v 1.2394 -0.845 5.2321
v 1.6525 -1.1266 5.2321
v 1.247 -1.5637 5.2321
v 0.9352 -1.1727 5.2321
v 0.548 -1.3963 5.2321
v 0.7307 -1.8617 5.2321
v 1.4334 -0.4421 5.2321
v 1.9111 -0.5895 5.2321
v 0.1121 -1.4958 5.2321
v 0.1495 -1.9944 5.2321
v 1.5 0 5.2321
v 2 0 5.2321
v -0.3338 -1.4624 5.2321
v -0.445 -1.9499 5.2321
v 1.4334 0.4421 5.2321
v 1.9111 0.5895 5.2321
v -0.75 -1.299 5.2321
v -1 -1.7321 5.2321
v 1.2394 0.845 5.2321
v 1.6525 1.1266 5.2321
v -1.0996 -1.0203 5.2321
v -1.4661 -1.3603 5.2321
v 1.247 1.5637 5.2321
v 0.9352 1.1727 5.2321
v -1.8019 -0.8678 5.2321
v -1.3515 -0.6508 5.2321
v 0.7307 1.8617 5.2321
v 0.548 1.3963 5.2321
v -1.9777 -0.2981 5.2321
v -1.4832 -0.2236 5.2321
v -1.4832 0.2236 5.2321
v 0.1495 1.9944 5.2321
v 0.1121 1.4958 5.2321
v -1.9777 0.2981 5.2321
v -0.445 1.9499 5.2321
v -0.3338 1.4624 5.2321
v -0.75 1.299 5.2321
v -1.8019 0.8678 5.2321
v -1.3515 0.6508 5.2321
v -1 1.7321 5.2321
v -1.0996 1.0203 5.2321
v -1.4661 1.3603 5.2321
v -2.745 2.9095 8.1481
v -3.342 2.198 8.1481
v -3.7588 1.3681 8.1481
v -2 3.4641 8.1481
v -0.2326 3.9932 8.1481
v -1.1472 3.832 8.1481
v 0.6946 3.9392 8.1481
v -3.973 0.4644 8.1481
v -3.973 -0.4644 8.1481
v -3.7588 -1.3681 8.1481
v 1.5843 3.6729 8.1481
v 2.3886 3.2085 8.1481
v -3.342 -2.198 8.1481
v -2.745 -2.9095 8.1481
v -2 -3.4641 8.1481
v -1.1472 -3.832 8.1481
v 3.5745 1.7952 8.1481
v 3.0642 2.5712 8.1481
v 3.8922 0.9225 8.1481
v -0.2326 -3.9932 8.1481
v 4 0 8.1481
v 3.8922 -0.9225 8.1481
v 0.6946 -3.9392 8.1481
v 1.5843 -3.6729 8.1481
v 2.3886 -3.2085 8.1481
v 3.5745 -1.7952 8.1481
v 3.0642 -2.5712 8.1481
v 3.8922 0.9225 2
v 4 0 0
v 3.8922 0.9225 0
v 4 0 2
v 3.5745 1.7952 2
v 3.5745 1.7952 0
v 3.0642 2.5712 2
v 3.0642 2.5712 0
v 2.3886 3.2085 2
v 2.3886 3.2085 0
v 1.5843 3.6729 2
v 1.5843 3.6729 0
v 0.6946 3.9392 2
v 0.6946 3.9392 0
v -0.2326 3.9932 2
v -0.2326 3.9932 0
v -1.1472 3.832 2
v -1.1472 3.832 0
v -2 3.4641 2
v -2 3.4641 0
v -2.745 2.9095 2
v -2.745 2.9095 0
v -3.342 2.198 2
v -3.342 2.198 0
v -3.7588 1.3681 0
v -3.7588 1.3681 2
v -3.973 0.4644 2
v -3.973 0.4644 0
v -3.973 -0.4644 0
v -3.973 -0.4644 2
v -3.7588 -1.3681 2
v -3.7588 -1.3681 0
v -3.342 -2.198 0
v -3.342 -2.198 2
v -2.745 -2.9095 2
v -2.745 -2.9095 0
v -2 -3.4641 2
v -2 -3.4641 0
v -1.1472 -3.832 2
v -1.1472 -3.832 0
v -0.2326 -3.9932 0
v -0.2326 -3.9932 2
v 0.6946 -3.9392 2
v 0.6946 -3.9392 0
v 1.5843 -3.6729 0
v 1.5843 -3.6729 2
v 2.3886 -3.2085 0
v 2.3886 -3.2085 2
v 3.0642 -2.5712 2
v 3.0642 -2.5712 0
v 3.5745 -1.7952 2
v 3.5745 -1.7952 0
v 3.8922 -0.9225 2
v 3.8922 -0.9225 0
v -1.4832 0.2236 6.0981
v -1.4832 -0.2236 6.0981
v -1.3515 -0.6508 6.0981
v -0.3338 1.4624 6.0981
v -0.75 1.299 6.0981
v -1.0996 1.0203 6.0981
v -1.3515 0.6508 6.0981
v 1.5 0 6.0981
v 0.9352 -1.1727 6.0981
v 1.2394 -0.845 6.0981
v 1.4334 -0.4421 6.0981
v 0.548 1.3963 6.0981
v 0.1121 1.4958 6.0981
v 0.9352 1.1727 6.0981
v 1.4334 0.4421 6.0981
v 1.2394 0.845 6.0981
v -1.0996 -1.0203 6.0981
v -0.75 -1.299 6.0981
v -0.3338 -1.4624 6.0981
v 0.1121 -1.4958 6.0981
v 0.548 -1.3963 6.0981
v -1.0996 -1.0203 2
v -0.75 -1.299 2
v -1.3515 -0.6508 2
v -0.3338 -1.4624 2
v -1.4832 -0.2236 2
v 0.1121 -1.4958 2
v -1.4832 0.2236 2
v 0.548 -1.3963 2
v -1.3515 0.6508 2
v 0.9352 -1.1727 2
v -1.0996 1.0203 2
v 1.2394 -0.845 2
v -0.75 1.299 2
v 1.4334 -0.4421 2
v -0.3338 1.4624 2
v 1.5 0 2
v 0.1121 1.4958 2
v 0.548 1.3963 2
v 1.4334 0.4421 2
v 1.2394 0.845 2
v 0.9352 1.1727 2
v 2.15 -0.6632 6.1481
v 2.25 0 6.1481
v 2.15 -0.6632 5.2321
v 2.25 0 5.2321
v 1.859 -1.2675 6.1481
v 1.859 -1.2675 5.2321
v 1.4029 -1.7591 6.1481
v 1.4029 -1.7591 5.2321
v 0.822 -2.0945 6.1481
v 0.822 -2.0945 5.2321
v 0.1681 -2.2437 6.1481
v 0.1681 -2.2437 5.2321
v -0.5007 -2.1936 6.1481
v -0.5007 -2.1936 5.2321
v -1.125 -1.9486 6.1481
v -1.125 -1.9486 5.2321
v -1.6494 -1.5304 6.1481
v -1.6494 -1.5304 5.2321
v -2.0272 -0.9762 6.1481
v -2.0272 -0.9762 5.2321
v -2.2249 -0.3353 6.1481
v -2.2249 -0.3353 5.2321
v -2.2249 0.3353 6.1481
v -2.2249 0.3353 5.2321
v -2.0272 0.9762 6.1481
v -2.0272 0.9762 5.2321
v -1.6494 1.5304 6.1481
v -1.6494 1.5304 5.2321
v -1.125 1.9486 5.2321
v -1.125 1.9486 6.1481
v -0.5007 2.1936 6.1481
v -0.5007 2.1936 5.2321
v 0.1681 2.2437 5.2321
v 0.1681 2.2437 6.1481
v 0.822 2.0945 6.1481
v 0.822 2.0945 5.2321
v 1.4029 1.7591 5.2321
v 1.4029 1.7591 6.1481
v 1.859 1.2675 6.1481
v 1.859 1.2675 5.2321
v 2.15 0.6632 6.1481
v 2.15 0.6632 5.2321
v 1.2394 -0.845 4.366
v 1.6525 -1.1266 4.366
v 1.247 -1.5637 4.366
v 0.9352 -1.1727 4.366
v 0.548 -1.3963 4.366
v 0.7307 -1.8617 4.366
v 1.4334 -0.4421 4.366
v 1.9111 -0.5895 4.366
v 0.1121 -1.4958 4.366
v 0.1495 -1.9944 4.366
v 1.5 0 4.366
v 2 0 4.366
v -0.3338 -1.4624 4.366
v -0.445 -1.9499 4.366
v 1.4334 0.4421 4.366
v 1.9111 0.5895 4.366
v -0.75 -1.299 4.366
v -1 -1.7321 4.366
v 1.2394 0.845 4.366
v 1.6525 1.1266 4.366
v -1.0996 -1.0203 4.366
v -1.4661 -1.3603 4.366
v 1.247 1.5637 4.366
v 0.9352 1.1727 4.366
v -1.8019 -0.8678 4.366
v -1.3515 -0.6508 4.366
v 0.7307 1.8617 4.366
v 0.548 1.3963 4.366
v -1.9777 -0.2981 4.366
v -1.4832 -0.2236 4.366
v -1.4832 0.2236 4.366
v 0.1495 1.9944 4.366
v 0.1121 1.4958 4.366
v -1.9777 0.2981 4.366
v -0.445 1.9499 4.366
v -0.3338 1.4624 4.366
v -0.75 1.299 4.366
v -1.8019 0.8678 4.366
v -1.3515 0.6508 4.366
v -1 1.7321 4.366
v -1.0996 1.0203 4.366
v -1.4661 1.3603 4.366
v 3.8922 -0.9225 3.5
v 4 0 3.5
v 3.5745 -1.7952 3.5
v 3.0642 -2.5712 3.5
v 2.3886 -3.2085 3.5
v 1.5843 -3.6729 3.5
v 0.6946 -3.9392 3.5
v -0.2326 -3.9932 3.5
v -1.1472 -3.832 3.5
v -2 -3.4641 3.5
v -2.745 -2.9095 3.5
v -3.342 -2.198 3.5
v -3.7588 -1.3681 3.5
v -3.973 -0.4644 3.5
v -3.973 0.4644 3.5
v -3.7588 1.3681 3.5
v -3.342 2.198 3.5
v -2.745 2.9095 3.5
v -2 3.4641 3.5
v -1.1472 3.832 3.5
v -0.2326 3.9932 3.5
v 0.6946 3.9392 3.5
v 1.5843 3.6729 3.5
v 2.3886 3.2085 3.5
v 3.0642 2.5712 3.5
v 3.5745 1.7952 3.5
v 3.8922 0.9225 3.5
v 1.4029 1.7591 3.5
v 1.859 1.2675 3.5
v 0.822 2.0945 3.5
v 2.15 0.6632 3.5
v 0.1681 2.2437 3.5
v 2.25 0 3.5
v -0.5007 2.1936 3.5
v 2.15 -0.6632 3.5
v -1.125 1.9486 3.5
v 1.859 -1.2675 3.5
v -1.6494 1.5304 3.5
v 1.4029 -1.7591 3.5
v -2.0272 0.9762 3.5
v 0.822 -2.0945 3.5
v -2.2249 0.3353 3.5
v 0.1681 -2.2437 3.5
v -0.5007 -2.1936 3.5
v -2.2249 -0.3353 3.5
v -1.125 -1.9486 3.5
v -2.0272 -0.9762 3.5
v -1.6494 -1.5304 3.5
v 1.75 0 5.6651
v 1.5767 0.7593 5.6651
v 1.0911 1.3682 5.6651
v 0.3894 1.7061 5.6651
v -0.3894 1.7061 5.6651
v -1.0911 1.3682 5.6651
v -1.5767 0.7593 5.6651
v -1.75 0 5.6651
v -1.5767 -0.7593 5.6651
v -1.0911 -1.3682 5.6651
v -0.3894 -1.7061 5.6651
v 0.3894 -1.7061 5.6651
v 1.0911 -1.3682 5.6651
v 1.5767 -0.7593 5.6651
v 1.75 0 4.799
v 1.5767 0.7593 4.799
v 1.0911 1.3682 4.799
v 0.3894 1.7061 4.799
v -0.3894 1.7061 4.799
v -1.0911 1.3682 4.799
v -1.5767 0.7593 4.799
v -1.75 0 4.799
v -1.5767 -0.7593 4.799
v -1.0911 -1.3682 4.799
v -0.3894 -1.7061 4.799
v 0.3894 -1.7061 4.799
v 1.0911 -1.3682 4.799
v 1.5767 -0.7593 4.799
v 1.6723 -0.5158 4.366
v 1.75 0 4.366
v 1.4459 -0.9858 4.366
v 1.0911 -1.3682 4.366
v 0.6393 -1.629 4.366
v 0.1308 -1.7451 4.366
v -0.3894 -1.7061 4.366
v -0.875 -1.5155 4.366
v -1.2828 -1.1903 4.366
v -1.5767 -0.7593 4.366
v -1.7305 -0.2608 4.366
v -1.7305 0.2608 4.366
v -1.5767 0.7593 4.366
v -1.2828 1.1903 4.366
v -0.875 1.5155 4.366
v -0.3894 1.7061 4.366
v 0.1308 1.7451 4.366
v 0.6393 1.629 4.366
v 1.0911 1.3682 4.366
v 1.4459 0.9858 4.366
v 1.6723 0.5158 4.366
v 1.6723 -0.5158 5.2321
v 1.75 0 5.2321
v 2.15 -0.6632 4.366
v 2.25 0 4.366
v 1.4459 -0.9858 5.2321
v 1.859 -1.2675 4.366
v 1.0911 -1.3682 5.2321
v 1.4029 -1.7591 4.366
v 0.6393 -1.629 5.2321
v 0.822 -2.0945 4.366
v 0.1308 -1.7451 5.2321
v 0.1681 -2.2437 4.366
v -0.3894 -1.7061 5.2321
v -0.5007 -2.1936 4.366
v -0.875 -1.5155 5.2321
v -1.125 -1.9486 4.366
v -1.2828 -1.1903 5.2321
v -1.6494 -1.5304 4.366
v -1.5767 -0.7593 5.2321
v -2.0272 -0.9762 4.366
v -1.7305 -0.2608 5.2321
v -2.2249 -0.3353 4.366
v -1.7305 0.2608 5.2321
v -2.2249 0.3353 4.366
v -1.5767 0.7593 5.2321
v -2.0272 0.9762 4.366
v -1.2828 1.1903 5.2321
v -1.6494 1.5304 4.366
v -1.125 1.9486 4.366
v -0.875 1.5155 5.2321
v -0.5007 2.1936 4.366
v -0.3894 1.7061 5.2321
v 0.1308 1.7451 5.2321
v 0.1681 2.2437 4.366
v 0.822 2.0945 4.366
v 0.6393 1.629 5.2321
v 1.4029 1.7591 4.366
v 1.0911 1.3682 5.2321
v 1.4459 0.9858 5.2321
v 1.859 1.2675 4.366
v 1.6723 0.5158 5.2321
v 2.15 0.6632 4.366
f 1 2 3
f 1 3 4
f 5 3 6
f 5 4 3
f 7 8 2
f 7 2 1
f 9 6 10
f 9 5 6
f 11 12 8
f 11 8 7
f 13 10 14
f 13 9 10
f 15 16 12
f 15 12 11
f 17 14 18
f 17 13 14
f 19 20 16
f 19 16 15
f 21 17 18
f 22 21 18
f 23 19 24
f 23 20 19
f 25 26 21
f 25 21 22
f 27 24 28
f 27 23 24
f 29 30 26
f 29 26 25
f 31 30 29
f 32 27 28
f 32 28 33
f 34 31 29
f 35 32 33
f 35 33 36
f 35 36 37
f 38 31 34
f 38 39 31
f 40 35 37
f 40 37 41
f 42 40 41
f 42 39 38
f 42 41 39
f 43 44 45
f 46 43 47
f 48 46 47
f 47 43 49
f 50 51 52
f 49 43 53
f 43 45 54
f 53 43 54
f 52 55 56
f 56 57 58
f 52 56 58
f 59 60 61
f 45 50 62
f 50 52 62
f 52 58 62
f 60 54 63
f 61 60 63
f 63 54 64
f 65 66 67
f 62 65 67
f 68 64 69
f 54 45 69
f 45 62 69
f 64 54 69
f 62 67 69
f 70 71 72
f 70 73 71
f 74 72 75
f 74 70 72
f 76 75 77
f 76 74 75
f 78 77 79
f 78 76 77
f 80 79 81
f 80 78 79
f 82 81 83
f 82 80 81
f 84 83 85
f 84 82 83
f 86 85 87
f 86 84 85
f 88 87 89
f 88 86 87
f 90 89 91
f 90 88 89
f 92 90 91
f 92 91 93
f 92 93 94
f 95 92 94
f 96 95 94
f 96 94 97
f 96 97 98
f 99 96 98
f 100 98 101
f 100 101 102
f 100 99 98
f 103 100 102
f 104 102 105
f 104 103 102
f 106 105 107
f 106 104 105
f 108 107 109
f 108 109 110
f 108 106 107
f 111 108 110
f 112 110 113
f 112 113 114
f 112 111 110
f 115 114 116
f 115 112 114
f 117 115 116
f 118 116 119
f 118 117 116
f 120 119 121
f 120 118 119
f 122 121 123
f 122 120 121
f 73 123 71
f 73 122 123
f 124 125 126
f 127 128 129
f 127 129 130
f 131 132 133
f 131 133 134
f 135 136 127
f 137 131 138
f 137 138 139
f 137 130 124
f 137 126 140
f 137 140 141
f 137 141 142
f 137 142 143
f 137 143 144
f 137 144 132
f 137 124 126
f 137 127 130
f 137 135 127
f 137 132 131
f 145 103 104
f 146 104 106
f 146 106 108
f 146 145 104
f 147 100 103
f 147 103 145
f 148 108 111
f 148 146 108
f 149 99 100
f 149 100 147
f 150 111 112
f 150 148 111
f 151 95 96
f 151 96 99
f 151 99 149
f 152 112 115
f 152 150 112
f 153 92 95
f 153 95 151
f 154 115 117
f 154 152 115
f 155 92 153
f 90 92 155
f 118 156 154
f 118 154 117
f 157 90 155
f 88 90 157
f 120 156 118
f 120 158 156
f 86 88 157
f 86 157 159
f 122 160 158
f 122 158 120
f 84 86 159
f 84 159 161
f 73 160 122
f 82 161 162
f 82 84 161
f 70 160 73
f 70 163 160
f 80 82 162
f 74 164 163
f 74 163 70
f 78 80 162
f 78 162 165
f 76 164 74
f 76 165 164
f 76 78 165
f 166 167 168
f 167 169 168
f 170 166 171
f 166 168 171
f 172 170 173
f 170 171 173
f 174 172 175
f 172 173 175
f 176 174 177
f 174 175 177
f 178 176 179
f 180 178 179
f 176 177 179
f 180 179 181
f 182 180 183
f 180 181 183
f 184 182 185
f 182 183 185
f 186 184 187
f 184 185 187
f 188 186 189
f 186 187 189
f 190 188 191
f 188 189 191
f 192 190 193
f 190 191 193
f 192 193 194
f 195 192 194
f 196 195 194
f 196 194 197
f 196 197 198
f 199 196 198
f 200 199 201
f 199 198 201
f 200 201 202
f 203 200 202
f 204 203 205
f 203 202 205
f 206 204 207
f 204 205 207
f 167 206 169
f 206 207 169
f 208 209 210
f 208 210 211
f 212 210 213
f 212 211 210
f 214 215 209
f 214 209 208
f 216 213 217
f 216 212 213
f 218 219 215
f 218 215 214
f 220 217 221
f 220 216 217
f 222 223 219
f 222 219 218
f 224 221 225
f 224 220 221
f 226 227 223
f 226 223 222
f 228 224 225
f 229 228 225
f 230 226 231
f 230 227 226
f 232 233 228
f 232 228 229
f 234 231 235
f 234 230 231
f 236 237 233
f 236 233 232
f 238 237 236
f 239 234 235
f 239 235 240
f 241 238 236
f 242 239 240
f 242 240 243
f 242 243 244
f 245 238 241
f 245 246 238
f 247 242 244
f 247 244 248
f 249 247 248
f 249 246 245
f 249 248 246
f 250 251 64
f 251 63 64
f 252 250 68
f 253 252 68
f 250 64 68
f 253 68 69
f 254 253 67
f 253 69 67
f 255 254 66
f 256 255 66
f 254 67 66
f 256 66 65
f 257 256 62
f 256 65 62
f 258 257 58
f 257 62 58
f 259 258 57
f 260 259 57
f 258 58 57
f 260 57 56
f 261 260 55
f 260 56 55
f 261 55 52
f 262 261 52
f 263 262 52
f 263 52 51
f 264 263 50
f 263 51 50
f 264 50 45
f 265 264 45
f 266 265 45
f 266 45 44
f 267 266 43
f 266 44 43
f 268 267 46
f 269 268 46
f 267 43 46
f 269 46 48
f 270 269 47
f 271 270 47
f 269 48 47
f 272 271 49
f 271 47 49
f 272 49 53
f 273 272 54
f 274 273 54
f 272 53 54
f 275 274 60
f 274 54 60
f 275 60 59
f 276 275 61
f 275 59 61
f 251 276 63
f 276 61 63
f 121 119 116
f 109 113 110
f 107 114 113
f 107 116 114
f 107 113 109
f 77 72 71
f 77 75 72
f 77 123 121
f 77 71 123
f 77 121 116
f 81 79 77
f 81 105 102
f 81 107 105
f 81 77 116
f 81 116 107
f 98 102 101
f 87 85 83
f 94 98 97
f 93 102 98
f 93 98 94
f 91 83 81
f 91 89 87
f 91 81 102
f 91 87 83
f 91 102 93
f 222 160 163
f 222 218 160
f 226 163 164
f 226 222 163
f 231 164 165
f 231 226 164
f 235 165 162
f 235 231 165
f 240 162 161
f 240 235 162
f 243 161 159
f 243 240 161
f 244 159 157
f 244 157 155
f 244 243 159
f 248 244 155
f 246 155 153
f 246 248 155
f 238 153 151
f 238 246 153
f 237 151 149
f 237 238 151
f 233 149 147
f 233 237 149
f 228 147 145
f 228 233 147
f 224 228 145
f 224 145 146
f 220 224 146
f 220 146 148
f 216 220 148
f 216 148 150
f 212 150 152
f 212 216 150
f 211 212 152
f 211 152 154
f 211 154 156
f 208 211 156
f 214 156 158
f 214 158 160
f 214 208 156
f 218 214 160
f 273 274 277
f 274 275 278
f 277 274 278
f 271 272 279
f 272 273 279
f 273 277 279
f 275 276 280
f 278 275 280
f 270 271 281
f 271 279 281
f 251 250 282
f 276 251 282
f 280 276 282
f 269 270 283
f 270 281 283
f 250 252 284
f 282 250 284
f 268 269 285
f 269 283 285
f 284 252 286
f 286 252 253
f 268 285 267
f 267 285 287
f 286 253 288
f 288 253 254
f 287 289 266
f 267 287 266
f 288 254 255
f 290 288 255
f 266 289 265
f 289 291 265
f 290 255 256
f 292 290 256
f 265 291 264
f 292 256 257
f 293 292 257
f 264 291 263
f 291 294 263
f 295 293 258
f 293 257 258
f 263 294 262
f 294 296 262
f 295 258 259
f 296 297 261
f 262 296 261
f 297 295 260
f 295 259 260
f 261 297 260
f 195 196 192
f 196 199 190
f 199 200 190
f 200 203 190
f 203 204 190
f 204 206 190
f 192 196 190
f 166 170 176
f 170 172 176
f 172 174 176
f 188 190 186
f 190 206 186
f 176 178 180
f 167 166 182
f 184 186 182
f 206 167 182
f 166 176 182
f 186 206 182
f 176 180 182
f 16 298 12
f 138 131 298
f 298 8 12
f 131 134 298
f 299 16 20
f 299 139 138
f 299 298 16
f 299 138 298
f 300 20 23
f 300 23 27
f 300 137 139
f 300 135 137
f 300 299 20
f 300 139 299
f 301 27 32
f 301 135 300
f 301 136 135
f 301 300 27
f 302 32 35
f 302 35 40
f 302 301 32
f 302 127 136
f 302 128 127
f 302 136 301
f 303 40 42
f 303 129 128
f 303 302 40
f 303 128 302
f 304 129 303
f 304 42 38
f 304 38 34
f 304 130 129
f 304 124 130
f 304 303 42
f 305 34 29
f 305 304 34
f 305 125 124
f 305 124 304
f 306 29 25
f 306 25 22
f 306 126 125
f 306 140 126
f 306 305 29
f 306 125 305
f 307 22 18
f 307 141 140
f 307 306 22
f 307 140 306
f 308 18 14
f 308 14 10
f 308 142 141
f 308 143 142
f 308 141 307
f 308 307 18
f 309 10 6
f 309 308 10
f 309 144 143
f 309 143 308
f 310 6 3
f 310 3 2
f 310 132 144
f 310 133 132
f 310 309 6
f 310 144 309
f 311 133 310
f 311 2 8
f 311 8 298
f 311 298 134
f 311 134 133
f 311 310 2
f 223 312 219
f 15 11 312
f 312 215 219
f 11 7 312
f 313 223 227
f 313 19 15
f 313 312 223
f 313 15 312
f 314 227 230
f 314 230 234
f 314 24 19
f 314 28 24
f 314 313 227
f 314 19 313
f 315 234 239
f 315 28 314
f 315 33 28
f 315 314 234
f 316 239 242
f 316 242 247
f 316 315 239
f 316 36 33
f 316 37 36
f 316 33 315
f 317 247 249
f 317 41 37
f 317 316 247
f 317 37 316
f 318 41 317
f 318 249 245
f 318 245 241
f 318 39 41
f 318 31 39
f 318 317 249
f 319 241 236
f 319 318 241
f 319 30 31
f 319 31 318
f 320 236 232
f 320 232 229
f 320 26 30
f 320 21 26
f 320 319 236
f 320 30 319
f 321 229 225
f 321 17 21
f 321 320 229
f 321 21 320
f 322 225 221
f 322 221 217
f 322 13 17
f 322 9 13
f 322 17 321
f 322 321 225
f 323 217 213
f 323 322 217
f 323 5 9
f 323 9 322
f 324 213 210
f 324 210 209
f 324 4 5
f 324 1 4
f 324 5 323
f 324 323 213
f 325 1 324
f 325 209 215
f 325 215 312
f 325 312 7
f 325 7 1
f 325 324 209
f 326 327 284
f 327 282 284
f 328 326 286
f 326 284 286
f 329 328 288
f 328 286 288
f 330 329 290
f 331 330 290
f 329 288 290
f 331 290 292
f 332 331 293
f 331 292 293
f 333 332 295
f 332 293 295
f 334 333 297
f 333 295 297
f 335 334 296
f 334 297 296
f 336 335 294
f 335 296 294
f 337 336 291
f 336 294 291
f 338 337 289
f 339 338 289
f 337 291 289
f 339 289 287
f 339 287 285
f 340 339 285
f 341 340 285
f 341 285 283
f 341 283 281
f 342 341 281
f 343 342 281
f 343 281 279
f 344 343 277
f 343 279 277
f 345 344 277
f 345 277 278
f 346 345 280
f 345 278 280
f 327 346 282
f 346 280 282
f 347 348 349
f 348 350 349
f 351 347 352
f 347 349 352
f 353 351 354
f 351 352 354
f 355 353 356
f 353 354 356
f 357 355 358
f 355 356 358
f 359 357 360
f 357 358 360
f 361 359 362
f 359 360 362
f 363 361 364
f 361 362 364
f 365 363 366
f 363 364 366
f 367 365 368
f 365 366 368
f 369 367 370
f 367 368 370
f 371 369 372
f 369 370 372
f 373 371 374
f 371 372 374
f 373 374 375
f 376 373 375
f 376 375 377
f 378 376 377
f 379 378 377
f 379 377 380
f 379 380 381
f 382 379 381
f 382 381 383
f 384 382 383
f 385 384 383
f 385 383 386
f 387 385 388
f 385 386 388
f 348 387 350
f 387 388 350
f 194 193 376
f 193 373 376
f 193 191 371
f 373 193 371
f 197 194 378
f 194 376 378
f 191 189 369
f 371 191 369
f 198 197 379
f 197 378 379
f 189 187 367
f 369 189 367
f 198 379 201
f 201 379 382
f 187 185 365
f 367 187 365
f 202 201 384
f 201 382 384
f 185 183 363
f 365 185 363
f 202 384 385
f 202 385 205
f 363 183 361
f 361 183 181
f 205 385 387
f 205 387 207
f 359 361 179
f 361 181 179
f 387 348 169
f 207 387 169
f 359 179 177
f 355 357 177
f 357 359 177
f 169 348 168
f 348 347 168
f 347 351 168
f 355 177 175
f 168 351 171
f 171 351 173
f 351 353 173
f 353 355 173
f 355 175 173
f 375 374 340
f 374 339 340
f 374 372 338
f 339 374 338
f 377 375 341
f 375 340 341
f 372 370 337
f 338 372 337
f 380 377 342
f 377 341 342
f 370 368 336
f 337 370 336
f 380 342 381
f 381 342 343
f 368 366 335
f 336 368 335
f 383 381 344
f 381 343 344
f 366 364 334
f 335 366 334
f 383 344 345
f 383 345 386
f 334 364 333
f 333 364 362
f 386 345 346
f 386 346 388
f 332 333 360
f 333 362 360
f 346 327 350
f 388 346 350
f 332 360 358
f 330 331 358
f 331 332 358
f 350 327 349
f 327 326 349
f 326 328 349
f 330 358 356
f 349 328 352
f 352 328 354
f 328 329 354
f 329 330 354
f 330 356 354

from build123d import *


with BuildPart() as f1:
    # F0 (on Front) → F1 (revolve)
    with BuildSketch(Plane.XZ):
        Polygon((0, 2), (0, 0), (1.5, 0), (4, 0), (4, 2), (1.5, 2), (1.5, 4.366025), (1.5, 5.232051), (1.5, 6.098076), (0, 6.098076), align=None)
        Polygon((2, 5.232051), (1.5, 6.098076), (1.5, 5.232051), (1.75, 5.232051), align=None)
        Polygon((2, 4.366025), (1.5, 5.232051), (1.5, 4.366025), (1.75, 4.366025), align=None)
    revolve(axis=Axis((0, 0, 3.049038), (0, 0, 1)))


with BuildPart() as f2:
    # F0 (on Front) → F2 (revolve)
    with BuildSketch(Plane.XZ):
        Polygon((2.25, 5.232051), (2, 5.232051), (1.75, 5.232051), (2.25, 4.366025), (2, 4.366025), (1.75, 4.366025), (2.25, 3.5), (4, 3.5), (4, 8.148076), (0, 8.148076), (0, 6.148076), (2.25, 6.148076), align=None)
    revolve(axis=Axis((0, 0, 7.148076), (0, 0, -1)))


solid = Compound([f1.part, f2.part])
